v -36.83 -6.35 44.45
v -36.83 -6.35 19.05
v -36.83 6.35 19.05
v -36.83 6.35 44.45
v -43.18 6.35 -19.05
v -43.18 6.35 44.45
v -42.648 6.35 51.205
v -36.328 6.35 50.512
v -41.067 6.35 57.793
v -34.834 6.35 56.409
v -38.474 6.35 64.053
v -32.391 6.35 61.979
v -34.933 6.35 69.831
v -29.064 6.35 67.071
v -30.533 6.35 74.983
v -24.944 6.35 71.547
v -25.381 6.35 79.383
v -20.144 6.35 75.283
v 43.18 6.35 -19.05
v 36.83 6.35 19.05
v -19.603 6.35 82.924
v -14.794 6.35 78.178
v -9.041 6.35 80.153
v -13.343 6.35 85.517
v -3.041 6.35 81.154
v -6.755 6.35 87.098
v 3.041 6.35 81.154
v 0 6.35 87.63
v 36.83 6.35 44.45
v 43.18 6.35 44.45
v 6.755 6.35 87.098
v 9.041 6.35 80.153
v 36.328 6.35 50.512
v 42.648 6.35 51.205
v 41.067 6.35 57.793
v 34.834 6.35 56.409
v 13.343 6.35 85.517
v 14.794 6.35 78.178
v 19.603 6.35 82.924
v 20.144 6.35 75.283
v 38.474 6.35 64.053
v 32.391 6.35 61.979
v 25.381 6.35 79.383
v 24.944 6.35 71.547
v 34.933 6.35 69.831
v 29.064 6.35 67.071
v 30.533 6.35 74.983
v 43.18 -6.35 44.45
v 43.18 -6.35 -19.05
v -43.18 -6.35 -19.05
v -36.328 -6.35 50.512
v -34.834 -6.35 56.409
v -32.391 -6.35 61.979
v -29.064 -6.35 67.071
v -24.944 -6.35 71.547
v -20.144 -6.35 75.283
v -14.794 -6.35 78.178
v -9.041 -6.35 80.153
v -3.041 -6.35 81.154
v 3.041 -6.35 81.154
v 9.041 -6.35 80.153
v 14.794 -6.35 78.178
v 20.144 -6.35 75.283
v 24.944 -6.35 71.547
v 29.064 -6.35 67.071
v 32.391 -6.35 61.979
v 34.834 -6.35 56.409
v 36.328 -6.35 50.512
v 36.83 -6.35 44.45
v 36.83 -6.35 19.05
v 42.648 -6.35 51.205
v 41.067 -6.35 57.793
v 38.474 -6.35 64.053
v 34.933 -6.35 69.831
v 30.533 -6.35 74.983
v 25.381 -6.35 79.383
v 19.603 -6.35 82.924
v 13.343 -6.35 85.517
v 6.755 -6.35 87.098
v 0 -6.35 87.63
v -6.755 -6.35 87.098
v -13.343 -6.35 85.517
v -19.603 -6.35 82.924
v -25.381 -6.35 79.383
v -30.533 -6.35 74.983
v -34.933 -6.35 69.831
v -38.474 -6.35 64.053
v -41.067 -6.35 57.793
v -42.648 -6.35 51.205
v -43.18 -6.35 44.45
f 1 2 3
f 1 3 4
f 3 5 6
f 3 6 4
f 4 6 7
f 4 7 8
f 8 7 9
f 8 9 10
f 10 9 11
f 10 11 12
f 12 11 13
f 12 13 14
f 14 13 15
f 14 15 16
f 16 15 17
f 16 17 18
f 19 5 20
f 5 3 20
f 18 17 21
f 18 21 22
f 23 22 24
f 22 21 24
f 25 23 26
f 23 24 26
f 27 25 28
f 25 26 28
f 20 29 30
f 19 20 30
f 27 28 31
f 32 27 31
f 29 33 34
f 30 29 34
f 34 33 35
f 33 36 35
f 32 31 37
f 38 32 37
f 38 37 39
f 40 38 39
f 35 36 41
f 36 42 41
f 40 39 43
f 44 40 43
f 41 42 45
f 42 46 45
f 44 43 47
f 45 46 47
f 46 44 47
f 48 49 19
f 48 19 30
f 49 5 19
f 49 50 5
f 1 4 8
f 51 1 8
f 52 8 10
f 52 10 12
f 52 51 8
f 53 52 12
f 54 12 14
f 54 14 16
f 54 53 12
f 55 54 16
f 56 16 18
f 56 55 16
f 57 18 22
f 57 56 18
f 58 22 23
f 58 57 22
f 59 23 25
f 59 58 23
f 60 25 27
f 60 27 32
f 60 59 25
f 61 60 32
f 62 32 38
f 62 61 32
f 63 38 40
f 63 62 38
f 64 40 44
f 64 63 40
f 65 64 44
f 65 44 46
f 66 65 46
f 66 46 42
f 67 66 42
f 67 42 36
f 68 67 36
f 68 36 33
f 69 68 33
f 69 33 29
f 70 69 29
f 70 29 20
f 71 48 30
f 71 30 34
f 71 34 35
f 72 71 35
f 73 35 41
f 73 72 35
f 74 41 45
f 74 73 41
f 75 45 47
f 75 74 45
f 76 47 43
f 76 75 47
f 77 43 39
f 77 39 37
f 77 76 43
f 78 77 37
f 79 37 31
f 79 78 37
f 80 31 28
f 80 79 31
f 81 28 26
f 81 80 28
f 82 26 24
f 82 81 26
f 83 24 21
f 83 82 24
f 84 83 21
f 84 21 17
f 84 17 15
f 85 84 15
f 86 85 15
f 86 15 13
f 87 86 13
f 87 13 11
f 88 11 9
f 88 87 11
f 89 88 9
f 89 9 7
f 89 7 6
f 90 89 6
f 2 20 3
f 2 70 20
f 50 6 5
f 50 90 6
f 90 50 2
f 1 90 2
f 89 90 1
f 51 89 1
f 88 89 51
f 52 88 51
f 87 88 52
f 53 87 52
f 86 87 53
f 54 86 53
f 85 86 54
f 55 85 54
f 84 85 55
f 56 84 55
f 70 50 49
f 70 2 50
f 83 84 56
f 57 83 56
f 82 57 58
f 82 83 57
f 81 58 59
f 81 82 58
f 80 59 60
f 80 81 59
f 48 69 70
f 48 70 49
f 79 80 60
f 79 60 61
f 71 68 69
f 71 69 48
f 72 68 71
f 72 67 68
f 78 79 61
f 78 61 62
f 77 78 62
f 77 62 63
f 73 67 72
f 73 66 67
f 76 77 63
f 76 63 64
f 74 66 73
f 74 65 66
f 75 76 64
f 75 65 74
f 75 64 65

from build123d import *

# Parameters (mm, degrees)
F1_DEPTH = 6.35


# Not quite as in the source:
# - ends of sketch curves that miss each other by under 0.0002 mm in the source are joined


with BuildPart() as f1:
    # F0 (on Front) → F1 (new body, symmetric)
    with BuildSketch(Plane.XZ):
        Polygon((-36.8300005794, 19.05), (-43.18, 19.05), (-43.18, -19.05), (43.18, -19.05), (43.18, 19.05), (36.8300005794, 19.05), align=None)
        with BuildLine():
            Line((-43.18, 44.45), (-43.18, 19.05))
            Line((-43.18, 19.05), (-36.8300005794, 19.05))
            Line((-36.8300005794, 19.05), (-36.8300005794, 44.45))
            ThreePointArc((-36.8300005794, 44.45), (0, 81.28), (36.83, 44.45))
            Line((36.83, 44.45), (36.8300005794, 19.05))
            Line((36.8300005794, 19.05), (43.18, 19.05))
            Line((43.18, 19.05), (43.18, 44.45))
            ThreePointArc((43.18, 44.45), (0, 87.63), (-43.18, 44.45))
        make_face()
    extrude(amount=F1_DEPTH, both=True)


solid = f1.part
